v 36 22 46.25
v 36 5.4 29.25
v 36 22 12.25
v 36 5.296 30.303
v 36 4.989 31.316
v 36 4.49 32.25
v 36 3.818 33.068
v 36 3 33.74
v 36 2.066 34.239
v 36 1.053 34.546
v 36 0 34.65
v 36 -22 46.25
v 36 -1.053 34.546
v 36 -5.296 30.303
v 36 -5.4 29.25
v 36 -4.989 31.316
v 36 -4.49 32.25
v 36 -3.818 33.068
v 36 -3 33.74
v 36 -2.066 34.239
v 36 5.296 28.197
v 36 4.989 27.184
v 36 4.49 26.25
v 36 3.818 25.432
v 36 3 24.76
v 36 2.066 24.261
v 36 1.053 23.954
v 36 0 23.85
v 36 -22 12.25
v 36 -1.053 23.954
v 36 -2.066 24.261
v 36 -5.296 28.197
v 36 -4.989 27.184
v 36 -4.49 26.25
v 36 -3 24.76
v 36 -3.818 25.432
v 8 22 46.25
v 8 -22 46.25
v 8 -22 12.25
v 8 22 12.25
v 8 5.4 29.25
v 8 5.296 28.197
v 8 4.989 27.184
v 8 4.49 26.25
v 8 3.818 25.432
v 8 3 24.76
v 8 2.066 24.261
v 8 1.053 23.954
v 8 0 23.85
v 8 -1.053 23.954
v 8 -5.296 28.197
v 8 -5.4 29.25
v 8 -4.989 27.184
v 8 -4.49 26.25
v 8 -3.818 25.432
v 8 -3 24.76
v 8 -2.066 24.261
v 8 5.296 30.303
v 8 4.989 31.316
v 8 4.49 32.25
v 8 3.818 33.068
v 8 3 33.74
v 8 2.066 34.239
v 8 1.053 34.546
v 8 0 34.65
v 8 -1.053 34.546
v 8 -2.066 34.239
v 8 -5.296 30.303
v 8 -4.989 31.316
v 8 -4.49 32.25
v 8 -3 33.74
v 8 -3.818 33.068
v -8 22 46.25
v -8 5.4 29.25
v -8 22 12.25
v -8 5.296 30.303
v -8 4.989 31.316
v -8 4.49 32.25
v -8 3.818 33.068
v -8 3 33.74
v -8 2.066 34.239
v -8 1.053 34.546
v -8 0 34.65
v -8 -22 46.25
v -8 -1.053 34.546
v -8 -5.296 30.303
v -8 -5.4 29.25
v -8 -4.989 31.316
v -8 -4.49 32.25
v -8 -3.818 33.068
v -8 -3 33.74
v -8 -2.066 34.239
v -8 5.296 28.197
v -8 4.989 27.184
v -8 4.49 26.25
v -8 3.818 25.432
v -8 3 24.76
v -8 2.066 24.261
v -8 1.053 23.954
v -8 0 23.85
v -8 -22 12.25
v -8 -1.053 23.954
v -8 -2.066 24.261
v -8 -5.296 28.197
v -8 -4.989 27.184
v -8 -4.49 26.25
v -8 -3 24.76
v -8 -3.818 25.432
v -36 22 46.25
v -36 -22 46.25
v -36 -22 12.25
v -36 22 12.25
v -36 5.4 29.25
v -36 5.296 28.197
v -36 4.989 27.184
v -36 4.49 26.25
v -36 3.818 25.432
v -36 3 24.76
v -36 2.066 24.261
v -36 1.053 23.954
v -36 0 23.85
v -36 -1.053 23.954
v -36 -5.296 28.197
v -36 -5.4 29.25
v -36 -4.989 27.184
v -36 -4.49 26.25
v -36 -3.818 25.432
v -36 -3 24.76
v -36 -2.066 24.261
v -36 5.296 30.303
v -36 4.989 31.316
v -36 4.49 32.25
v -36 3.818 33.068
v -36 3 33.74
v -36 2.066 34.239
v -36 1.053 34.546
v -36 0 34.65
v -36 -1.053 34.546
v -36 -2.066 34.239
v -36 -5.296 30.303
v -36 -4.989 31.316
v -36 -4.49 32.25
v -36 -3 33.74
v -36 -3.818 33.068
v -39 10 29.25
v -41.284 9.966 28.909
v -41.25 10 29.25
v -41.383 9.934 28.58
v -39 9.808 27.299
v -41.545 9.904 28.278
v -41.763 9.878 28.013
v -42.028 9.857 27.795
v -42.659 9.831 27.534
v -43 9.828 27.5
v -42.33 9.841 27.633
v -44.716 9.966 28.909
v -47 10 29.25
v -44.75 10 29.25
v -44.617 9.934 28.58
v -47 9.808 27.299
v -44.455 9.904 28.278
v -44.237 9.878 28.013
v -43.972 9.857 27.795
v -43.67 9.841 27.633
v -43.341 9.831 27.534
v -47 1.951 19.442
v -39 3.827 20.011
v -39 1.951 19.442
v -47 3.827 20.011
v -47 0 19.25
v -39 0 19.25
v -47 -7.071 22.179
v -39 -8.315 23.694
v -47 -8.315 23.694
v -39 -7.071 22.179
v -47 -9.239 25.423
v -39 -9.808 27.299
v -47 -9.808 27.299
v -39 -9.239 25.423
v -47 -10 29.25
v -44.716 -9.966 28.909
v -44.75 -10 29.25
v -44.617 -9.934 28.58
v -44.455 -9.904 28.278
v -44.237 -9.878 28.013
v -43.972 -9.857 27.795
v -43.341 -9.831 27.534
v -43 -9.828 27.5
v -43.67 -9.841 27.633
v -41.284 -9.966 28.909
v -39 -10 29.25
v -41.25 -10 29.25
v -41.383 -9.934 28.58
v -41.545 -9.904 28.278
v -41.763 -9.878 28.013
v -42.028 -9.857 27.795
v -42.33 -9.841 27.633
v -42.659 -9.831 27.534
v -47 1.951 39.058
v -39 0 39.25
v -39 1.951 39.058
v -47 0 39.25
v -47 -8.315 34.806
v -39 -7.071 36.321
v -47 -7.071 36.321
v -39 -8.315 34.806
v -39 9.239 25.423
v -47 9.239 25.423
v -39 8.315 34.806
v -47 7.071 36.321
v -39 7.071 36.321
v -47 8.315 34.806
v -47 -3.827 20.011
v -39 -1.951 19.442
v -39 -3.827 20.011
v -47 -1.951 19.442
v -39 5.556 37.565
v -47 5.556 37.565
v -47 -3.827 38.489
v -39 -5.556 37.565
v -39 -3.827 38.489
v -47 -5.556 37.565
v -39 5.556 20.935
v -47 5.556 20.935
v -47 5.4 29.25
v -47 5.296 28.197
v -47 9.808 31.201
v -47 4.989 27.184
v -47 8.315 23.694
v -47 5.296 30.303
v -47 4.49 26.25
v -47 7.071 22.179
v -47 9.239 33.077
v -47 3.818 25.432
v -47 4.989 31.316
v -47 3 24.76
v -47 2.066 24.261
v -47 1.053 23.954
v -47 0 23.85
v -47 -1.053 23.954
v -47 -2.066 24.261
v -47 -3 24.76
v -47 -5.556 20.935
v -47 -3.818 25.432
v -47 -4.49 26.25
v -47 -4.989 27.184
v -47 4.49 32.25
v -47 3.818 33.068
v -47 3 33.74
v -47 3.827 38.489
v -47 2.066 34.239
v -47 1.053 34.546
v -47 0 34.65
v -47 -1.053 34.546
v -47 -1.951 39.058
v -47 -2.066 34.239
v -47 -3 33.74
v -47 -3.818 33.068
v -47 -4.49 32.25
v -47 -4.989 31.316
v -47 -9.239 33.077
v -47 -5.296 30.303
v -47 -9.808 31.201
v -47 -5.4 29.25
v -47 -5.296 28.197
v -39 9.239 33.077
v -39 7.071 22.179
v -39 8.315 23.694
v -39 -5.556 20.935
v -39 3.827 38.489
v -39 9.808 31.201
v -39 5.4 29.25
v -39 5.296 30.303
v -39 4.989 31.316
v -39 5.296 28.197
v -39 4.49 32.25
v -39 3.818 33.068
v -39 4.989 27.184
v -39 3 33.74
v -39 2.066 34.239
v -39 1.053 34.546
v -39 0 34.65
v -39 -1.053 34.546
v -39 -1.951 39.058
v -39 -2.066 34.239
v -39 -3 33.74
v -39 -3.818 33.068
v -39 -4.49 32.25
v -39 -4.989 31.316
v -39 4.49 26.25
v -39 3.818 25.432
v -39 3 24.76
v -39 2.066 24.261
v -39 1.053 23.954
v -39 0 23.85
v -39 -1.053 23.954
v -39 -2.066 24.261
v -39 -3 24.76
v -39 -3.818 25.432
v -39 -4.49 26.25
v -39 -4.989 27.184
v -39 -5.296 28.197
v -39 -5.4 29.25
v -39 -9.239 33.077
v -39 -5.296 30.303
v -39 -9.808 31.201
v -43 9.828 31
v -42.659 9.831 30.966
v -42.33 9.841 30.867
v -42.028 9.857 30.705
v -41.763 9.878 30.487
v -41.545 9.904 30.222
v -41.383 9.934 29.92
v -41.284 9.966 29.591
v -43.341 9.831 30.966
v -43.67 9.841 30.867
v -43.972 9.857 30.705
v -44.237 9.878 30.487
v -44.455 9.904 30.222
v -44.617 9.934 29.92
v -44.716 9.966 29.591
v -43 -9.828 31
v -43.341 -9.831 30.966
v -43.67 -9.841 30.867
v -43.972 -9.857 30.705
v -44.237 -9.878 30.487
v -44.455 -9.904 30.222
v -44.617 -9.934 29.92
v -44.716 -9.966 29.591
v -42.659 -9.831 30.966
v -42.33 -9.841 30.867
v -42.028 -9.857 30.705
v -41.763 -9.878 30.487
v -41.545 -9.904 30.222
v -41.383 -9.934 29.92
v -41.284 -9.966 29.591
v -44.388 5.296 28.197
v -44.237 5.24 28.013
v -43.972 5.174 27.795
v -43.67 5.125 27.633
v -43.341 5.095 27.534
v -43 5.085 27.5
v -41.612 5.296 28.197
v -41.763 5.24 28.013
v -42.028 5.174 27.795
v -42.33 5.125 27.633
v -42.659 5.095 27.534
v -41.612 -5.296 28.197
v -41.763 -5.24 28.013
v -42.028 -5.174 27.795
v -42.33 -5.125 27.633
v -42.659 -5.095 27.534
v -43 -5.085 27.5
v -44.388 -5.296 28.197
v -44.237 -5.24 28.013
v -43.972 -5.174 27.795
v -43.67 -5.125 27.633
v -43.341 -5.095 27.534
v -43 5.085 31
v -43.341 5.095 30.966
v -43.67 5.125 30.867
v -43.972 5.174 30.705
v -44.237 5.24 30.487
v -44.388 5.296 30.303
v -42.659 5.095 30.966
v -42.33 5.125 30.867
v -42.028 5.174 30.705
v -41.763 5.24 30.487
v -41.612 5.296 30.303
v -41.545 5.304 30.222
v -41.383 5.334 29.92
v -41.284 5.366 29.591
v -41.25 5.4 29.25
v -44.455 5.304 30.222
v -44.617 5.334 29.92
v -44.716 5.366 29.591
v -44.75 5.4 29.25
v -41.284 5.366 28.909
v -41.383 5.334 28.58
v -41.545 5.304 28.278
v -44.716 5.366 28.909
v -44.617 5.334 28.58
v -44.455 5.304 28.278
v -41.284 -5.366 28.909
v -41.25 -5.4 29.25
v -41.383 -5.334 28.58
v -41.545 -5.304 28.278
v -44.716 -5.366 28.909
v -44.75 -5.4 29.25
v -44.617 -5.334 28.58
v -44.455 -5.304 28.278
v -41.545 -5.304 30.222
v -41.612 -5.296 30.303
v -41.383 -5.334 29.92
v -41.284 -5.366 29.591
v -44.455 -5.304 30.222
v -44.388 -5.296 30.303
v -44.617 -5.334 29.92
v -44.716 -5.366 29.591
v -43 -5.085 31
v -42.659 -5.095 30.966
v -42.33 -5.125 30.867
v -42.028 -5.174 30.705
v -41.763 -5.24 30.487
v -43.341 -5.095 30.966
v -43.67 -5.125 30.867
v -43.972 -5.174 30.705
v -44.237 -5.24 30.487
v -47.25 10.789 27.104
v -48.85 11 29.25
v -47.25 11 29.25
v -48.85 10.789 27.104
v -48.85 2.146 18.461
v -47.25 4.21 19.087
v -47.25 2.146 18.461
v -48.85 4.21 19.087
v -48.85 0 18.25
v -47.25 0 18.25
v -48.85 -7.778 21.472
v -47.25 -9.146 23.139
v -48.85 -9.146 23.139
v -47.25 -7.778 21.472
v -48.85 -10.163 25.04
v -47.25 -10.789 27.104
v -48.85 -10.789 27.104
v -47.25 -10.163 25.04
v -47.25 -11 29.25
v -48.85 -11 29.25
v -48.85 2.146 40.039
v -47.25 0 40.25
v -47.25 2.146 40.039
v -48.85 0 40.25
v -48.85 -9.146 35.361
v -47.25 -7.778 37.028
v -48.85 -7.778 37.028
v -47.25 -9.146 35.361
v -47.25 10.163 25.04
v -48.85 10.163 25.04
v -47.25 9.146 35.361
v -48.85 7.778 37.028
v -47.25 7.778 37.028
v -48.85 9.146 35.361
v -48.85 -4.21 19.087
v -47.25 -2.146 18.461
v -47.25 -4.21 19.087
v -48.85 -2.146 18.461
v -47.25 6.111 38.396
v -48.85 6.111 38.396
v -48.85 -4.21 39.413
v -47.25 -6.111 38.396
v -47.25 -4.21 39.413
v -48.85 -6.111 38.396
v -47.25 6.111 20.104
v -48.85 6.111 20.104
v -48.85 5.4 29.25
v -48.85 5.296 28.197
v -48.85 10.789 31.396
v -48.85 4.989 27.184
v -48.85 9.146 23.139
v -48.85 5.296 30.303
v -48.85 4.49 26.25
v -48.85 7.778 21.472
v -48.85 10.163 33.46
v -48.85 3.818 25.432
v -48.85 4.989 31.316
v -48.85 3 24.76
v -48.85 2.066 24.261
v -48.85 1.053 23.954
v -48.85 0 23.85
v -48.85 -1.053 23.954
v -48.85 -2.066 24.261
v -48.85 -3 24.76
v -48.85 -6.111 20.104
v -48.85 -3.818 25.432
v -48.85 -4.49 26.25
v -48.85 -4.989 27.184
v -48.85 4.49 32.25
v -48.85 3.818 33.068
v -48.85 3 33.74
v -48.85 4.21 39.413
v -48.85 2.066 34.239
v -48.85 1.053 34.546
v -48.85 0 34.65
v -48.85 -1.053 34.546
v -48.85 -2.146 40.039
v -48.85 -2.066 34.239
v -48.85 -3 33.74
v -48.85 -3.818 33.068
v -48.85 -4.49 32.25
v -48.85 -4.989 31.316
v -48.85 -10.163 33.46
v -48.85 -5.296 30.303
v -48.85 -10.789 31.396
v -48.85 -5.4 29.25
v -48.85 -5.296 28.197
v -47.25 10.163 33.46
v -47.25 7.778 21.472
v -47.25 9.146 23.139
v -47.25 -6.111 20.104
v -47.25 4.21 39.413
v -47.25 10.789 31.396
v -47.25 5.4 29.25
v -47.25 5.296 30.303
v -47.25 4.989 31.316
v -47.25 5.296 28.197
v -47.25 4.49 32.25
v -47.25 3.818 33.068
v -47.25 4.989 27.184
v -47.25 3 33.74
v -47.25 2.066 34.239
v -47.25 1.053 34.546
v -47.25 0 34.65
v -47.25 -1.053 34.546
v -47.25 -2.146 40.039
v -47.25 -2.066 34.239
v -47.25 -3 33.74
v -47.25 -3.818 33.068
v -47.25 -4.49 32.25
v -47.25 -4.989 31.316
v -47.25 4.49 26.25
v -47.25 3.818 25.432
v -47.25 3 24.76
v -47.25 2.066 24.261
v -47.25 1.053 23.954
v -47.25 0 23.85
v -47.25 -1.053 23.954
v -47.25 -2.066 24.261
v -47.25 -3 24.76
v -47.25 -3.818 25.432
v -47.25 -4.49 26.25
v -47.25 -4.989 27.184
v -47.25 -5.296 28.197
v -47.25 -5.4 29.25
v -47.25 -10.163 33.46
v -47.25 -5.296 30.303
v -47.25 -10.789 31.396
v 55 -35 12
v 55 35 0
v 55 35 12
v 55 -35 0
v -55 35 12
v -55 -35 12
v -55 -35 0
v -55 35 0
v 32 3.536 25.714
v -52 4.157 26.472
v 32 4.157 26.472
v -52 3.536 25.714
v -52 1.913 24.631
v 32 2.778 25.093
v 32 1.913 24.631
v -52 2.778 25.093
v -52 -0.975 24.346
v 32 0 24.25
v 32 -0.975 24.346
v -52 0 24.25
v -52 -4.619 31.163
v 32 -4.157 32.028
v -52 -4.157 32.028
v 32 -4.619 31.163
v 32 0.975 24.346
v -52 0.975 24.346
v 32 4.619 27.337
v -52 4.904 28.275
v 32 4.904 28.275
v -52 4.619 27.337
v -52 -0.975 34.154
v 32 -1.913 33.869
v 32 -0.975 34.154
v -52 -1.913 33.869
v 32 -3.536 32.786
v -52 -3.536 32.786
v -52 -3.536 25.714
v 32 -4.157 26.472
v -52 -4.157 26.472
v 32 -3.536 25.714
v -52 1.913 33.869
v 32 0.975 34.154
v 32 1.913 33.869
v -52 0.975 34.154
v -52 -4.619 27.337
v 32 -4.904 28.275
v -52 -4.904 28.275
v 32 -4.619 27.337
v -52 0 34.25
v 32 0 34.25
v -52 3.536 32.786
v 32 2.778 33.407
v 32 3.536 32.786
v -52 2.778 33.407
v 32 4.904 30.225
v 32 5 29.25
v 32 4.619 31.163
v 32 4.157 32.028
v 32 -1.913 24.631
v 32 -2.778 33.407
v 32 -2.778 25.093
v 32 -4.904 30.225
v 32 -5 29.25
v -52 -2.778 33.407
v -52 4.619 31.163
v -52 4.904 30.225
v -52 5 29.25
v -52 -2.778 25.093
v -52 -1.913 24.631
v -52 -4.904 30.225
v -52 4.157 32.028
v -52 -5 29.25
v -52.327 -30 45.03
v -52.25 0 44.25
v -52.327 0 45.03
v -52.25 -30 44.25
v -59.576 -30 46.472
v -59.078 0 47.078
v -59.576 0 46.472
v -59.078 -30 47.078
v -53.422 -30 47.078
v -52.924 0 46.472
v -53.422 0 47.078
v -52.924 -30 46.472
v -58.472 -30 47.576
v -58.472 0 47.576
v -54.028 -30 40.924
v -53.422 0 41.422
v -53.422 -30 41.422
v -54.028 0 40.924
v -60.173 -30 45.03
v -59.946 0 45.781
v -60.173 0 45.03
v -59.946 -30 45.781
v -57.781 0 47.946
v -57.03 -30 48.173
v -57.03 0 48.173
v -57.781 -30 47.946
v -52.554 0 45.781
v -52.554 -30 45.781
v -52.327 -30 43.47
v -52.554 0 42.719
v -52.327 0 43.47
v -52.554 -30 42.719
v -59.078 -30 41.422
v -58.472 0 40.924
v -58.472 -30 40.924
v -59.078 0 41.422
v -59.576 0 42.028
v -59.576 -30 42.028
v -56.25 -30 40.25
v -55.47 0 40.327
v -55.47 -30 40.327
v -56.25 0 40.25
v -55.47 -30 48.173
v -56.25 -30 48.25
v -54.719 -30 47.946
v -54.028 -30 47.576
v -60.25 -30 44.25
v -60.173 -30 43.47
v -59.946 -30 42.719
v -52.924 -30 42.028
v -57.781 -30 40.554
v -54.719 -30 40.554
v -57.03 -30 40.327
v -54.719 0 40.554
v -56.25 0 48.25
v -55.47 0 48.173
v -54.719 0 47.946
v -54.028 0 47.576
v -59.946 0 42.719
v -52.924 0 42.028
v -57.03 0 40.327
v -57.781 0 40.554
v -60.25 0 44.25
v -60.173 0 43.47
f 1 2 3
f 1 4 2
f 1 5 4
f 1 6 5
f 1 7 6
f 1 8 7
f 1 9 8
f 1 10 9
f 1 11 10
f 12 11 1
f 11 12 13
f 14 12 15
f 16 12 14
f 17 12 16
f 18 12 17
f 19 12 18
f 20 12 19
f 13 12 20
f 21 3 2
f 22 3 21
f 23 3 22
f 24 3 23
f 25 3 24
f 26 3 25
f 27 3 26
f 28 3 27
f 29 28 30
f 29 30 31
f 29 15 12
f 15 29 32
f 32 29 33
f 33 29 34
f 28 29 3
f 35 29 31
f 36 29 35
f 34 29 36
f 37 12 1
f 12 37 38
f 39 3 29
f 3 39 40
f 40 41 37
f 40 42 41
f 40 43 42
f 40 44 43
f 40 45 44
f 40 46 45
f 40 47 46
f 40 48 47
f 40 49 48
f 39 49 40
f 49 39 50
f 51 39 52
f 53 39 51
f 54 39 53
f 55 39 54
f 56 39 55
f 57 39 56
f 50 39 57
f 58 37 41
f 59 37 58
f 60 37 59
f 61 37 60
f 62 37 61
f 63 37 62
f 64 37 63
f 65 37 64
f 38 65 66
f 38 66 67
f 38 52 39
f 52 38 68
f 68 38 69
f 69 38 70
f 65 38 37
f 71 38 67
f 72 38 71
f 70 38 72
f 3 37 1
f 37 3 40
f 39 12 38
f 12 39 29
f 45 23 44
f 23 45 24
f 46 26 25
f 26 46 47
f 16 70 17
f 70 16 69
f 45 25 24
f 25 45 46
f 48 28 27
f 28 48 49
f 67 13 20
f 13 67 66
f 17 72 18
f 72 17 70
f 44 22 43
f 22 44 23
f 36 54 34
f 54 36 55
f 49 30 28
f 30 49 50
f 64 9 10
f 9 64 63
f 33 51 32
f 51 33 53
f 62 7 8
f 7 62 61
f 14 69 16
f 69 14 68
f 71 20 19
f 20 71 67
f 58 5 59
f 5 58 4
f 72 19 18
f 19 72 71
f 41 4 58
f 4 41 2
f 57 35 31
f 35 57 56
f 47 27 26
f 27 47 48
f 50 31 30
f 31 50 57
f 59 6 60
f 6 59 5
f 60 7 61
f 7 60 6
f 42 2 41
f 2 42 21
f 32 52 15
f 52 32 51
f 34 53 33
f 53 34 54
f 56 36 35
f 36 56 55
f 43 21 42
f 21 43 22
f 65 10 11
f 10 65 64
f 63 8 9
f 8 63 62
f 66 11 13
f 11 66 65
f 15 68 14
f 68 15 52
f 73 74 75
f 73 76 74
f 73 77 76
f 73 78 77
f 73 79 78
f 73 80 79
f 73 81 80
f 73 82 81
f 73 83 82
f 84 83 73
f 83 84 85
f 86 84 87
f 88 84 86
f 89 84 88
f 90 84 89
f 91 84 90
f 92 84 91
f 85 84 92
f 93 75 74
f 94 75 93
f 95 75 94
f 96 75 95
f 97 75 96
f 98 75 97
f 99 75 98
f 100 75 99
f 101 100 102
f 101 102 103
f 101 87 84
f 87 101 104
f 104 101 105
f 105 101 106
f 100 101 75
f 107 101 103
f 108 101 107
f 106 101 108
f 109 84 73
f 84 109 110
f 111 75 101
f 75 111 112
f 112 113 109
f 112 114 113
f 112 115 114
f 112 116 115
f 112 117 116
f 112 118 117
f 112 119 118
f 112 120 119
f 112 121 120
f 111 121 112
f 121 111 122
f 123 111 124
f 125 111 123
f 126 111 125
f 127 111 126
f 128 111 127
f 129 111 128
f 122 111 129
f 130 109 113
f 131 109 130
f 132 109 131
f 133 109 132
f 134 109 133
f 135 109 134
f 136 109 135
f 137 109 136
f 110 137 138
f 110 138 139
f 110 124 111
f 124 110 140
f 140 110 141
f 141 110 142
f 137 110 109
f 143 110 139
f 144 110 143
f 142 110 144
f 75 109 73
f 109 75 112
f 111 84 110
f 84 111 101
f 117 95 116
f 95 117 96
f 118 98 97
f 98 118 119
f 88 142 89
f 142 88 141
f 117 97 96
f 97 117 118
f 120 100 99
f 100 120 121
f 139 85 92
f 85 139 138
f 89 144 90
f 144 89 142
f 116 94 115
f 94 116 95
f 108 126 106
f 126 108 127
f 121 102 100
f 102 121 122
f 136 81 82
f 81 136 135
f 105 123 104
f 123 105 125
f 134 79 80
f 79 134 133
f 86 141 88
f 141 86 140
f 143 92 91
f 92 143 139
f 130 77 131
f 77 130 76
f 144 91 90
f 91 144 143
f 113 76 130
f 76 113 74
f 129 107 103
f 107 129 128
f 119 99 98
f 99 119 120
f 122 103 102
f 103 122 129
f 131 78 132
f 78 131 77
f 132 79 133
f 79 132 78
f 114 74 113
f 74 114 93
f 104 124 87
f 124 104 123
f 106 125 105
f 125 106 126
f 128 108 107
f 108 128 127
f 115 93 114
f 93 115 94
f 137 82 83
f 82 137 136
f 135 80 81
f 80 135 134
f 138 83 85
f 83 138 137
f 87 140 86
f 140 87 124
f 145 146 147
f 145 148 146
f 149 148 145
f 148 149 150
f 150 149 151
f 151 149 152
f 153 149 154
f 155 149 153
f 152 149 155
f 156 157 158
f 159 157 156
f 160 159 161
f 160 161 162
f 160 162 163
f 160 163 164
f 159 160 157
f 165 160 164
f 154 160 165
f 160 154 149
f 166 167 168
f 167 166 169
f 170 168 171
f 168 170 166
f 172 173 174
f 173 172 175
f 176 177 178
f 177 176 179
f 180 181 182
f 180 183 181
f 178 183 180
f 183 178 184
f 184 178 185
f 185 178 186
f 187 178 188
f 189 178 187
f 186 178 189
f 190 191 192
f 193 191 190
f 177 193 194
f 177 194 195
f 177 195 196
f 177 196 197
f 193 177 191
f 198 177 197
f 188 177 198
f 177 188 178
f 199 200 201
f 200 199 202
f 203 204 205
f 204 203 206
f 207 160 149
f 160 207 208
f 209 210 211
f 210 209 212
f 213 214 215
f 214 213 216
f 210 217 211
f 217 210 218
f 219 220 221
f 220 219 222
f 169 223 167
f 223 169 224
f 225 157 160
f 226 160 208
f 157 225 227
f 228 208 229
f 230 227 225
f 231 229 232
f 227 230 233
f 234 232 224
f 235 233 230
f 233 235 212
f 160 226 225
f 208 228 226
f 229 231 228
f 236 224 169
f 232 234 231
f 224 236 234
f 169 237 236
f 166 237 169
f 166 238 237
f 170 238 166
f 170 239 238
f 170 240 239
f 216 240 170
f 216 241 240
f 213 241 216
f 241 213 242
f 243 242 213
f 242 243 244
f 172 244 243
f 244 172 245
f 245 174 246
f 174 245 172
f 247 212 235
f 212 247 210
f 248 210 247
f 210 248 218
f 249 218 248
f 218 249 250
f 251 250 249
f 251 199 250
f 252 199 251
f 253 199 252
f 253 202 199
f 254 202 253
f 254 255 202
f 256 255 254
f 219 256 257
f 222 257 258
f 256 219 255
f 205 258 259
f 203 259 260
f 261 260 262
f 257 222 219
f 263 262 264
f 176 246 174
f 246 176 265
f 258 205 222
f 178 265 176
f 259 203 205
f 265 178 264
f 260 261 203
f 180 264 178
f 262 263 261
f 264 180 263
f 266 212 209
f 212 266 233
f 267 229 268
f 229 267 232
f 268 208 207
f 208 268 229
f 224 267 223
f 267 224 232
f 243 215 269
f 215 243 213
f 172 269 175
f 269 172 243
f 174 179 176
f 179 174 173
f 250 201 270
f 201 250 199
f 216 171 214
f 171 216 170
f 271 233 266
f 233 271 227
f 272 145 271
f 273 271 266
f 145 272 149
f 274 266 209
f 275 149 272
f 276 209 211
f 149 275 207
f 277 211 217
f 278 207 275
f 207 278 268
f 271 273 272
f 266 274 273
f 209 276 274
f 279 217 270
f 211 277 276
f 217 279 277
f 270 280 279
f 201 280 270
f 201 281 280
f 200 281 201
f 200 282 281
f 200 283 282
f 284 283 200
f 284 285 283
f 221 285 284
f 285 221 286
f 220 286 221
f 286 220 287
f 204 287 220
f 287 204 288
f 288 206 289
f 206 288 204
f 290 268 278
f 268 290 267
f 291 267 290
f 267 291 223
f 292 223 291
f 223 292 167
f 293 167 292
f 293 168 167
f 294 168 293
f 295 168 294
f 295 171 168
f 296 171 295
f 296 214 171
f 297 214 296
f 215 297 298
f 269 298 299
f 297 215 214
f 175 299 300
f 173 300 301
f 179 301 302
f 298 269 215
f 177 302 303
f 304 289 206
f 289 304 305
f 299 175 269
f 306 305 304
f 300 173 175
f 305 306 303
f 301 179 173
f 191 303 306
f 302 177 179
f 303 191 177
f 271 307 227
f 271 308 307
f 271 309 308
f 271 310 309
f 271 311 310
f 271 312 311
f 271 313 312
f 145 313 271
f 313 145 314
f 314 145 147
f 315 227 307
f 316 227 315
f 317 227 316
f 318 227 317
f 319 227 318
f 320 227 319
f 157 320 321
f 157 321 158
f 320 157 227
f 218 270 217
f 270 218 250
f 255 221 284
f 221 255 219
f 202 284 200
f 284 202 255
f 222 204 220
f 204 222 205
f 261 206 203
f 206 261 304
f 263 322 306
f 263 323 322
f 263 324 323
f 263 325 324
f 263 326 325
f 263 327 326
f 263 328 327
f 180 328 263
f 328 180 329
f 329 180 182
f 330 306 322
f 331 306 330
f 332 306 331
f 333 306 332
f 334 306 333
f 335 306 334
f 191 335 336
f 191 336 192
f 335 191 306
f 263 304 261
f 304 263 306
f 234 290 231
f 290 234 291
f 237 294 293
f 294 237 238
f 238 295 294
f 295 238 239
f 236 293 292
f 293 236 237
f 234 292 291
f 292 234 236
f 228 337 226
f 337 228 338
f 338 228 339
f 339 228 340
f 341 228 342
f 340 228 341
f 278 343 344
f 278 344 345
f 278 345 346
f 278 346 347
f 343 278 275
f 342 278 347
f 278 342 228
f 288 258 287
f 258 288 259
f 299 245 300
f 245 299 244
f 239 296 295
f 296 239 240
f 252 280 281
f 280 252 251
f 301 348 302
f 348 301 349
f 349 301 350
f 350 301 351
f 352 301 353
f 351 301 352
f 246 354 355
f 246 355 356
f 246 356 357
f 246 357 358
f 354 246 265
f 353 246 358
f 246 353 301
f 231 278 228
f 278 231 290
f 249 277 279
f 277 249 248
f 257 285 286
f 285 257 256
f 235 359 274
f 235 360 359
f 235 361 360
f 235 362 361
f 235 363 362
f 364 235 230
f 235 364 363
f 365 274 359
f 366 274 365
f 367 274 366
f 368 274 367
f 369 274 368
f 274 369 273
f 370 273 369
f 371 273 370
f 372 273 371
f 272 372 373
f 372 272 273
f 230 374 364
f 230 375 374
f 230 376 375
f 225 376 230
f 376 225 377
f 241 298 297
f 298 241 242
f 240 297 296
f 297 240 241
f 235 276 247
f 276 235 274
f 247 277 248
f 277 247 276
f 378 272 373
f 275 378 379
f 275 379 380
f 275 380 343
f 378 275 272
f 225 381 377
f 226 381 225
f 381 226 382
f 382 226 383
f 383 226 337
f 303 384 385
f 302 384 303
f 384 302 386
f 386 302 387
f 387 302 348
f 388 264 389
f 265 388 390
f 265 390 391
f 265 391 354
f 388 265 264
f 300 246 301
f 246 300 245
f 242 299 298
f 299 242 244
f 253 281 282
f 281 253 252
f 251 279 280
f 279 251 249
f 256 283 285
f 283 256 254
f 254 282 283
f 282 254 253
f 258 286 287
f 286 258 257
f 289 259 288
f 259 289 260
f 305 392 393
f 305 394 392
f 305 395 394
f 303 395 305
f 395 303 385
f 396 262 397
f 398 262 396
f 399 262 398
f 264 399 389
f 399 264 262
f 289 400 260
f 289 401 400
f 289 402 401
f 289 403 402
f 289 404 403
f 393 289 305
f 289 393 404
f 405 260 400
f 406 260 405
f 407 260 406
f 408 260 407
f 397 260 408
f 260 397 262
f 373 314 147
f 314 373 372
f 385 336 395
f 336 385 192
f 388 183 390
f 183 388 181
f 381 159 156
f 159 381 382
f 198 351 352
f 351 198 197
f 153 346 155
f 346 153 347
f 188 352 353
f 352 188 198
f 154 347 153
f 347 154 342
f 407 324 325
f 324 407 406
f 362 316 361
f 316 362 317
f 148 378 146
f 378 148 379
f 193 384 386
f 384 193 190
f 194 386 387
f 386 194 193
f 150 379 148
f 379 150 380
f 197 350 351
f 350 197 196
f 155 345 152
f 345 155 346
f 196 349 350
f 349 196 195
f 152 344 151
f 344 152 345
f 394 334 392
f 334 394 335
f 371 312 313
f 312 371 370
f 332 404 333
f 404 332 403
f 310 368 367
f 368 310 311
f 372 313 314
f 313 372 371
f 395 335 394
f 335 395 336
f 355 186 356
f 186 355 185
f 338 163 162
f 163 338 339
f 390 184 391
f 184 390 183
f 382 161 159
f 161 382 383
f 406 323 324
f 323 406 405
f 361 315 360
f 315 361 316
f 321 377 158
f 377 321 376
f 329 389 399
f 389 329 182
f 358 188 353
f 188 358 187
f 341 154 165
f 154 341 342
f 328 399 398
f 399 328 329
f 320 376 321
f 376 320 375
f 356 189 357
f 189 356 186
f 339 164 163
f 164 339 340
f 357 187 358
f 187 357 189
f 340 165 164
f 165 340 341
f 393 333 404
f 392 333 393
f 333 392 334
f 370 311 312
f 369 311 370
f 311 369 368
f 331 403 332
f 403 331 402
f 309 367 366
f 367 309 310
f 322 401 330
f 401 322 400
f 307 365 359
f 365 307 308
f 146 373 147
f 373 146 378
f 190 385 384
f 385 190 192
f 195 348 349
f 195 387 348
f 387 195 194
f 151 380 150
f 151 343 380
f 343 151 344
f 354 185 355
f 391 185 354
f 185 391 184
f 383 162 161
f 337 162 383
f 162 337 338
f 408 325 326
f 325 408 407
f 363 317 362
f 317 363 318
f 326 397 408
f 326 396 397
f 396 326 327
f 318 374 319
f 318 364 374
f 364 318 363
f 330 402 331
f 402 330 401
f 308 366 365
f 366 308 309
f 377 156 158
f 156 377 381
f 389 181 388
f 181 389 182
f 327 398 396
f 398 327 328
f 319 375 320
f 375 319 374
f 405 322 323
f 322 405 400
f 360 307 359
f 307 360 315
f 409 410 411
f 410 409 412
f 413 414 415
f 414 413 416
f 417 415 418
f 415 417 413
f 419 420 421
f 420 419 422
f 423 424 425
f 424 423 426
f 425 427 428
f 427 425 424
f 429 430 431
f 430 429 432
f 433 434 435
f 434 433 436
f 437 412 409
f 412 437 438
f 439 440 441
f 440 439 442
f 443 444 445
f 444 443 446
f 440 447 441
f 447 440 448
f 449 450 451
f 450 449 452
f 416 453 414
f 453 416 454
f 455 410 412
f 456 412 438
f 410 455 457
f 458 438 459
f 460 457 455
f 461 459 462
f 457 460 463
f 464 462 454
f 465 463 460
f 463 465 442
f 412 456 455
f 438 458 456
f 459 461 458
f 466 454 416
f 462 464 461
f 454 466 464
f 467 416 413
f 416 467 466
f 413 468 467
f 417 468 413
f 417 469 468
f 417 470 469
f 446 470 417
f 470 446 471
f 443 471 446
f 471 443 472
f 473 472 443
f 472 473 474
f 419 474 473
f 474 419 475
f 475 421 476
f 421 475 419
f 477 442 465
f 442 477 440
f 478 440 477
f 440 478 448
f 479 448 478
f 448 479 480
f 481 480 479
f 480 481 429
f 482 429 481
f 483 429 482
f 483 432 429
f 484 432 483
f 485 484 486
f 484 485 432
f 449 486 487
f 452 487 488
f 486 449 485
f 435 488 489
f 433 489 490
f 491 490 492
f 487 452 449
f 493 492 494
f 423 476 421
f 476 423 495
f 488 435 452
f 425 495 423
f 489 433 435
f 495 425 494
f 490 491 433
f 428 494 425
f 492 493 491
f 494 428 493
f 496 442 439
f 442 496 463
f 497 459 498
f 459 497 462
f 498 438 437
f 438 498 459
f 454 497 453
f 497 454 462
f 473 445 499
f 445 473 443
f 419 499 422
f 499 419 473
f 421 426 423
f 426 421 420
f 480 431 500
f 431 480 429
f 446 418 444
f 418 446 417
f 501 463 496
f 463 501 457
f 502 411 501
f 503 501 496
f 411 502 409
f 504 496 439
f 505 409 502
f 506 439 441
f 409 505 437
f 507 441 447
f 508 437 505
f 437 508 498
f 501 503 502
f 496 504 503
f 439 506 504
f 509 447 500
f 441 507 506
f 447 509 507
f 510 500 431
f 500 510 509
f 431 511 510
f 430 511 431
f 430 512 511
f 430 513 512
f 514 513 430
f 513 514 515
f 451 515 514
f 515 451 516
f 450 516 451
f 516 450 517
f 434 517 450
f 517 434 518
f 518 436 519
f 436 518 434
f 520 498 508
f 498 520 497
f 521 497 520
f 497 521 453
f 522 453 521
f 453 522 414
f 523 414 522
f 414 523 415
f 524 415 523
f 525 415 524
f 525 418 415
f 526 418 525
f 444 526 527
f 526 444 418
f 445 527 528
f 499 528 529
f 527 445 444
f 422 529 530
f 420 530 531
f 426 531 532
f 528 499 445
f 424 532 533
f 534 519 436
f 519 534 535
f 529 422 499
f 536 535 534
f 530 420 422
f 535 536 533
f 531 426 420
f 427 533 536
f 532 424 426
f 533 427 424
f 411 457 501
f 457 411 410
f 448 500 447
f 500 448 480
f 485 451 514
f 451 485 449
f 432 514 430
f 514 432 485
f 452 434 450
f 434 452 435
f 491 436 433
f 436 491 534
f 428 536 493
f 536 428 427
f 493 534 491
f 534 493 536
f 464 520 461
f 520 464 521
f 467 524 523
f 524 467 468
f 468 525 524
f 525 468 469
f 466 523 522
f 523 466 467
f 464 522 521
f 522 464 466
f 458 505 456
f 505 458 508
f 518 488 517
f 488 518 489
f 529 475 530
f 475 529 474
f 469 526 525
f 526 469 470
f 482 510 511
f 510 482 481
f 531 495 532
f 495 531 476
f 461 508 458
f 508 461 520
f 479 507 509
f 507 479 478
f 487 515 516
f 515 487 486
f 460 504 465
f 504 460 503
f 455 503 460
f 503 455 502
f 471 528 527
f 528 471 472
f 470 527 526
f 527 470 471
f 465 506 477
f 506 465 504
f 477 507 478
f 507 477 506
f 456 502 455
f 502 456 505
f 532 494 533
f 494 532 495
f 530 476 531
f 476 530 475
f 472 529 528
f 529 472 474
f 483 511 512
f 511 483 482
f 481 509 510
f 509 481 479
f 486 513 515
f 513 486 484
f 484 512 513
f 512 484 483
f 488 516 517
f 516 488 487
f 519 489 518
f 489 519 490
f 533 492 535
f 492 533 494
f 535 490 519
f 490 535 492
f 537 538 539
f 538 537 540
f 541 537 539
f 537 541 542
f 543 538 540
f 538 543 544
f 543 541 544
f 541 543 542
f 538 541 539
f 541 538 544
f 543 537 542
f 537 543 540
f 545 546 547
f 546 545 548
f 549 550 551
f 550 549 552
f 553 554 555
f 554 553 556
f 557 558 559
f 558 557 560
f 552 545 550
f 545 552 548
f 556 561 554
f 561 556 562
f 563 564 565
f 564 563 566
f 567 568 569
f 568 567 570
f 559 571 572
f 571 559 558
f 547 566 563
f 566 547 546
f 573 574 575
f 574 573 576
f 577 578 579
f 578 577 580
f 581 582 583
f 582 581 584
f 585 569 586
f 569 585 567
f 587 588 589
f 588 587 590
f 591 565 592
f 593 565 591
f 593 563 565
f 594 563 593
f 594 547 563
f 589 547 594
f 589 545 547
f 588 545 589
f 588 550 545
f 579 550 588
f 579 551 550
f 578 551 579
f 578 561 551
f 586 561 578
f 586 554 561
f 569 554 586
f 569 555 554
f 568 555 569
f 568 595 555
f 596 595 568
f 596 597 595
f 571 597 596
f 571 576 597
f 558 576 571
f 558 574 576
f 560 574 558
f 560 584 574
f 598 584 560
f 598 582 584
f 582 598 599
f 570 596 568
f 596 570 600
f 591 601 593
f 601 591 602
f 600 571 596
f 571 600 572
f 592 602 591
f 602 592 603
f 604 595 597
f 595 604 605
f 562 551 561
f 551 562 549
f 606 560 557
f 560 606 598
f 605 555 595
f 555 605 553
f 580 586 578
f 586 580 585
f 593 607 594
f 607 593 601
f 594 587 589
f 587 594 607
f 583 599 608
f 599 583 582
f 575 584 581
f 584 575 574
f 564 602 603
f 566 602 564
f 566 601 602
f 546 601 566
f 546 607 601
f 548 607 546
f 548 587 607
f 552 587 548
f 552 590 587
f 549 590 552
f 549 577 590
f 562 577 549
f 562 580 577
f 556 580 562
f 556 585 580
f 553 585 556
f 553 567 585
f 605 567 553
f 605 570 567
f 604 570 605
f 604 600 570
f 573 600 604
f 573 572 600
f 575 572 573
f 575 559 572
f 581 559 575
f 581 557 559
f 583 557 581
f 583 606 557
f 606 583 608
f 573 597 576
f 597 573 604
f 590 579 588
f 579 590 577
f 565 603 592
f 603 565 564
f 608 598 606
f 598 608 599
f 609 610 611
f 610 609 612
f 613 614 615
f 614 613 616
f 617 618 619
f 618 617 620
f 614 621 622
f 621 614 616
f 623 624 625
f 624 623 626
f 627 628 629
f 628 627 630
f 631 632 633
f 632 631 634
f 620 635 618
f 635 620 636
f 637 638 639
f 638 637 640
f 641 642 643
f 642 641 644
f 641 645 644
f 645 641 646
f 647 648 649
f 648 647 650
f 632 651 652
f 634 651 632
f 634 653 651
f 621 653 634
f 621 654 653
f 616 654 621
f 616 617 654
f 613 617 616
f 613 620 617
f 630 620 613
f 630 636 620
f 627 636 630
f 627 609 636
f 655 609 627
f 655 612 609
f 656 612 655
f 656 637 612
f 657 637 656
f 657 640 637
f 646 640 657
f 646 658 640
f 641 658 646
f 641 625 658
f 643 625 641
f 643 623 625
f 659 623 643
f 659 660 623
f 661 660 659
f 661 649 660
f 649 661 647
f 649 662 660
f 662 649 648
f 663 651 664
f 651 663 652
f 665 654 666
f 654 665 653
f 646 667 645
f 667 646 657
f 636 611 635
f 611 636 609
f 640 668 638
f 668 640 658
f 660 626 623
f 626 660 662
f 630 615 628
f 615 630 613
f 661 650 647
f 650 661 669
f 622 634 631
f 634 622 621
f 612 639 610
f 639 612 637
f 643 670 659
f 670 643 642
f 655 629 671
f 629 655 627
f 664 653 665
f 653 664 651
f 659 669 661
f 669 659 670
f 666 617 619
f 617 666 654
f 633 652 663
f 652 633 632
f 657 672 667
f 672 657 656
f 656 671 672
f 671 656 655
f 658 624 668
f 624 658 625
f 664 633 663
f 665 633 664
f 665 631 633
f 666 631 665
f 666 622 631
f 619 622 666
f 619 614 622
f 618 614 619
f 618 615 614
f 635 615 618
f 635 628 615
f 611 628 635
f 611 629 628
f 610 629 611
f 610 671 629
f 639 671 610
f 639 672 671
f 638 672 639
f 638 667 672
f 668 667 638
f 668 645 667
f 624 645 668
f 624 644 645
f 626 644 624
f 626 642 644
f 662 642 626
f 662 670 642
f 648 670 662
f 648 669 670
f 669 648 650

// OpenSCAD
$fn = 32;

// ------------------------------------------------------------------------
// Machine vise: screw d10, jaws 28 x 34 mm
// Every part is its own module, assembly() places every instance.
// ------------------------------------------------------------------------

// --- part 1 ---
module vise_bed() {
  difference() {
    translate([-55, -35, 0]) cube([110, 70, 12]);
  }
}

// --- part 2 ---
module vise_jaw() {
  difference() {
    translate([-14, -22, 0]) cube([28, 44, 34]);
    translate([0, 0, 17]) rotate([0, 90, 0]) cylinder(h = 30, d = 10.8, center = true);
  }
}

// --- part 3 ---
module vise_screw() {
  translate([0, 0, -42]) cylinder(h = 84, d = 10);
}

// --- part 4 ---
module screw_collar() {
  difference() {
    cylinder(h = 8, d = 20);
    translate([0, 0, -1]) cylinder(h = 10, d = 10.8);
    translate([0, 0, 4]) rotate([90, 0, 0]) cylinder(h = 22, d = 3.5, center = true);
  }
}

// --- part 5 ---
module screw_washer() {
  difference() {
      translate([0, 0, 0]) cylinder(h = 1.6, d = 22);
      translate([0, 0, -1]) cylinder(h = 3.6, d = 10.8);
    }
}

// --- part 6 ---
module vise_handle() {
  cylinder(h = 30, d = 8);
}

// --- assembly ---
module assembly() {
  color([0.80, 0.24, 0.20]) translate([0, 0, 0]) rotate([0, 0, 0]) vise_bed();
  color([0.20, 0.45, 0.75]) translate([22, 0, 12.25]) rotate([0, 0, 0]) vise_jaw();
  color([0.25, 0.62, 0.32]) translate([-22, 0, 12.25]) rotate([0, 0, 0]) vise_jaw();
  color([0.92, 0.70, 0.18]) translate([-10, 0, 29.25]) rotate([0, 90, 0]) vise_screw();
  color([0.58, 0.35, 0.70]) translate([-47, 0, 29.25]) rotate([0, 90, 0]) screw_collar();
  color([0.16, 0.66, 0.66]) translate([-48.85, 0, 29.25]) rotate([0, 90, 0]) screw_washer();
  color([0.85, 0.48, 0.18]) translate([-56.25, 0, 44.25]) rotate([90, 0, 0]) vise_handle();
}

assembly();
